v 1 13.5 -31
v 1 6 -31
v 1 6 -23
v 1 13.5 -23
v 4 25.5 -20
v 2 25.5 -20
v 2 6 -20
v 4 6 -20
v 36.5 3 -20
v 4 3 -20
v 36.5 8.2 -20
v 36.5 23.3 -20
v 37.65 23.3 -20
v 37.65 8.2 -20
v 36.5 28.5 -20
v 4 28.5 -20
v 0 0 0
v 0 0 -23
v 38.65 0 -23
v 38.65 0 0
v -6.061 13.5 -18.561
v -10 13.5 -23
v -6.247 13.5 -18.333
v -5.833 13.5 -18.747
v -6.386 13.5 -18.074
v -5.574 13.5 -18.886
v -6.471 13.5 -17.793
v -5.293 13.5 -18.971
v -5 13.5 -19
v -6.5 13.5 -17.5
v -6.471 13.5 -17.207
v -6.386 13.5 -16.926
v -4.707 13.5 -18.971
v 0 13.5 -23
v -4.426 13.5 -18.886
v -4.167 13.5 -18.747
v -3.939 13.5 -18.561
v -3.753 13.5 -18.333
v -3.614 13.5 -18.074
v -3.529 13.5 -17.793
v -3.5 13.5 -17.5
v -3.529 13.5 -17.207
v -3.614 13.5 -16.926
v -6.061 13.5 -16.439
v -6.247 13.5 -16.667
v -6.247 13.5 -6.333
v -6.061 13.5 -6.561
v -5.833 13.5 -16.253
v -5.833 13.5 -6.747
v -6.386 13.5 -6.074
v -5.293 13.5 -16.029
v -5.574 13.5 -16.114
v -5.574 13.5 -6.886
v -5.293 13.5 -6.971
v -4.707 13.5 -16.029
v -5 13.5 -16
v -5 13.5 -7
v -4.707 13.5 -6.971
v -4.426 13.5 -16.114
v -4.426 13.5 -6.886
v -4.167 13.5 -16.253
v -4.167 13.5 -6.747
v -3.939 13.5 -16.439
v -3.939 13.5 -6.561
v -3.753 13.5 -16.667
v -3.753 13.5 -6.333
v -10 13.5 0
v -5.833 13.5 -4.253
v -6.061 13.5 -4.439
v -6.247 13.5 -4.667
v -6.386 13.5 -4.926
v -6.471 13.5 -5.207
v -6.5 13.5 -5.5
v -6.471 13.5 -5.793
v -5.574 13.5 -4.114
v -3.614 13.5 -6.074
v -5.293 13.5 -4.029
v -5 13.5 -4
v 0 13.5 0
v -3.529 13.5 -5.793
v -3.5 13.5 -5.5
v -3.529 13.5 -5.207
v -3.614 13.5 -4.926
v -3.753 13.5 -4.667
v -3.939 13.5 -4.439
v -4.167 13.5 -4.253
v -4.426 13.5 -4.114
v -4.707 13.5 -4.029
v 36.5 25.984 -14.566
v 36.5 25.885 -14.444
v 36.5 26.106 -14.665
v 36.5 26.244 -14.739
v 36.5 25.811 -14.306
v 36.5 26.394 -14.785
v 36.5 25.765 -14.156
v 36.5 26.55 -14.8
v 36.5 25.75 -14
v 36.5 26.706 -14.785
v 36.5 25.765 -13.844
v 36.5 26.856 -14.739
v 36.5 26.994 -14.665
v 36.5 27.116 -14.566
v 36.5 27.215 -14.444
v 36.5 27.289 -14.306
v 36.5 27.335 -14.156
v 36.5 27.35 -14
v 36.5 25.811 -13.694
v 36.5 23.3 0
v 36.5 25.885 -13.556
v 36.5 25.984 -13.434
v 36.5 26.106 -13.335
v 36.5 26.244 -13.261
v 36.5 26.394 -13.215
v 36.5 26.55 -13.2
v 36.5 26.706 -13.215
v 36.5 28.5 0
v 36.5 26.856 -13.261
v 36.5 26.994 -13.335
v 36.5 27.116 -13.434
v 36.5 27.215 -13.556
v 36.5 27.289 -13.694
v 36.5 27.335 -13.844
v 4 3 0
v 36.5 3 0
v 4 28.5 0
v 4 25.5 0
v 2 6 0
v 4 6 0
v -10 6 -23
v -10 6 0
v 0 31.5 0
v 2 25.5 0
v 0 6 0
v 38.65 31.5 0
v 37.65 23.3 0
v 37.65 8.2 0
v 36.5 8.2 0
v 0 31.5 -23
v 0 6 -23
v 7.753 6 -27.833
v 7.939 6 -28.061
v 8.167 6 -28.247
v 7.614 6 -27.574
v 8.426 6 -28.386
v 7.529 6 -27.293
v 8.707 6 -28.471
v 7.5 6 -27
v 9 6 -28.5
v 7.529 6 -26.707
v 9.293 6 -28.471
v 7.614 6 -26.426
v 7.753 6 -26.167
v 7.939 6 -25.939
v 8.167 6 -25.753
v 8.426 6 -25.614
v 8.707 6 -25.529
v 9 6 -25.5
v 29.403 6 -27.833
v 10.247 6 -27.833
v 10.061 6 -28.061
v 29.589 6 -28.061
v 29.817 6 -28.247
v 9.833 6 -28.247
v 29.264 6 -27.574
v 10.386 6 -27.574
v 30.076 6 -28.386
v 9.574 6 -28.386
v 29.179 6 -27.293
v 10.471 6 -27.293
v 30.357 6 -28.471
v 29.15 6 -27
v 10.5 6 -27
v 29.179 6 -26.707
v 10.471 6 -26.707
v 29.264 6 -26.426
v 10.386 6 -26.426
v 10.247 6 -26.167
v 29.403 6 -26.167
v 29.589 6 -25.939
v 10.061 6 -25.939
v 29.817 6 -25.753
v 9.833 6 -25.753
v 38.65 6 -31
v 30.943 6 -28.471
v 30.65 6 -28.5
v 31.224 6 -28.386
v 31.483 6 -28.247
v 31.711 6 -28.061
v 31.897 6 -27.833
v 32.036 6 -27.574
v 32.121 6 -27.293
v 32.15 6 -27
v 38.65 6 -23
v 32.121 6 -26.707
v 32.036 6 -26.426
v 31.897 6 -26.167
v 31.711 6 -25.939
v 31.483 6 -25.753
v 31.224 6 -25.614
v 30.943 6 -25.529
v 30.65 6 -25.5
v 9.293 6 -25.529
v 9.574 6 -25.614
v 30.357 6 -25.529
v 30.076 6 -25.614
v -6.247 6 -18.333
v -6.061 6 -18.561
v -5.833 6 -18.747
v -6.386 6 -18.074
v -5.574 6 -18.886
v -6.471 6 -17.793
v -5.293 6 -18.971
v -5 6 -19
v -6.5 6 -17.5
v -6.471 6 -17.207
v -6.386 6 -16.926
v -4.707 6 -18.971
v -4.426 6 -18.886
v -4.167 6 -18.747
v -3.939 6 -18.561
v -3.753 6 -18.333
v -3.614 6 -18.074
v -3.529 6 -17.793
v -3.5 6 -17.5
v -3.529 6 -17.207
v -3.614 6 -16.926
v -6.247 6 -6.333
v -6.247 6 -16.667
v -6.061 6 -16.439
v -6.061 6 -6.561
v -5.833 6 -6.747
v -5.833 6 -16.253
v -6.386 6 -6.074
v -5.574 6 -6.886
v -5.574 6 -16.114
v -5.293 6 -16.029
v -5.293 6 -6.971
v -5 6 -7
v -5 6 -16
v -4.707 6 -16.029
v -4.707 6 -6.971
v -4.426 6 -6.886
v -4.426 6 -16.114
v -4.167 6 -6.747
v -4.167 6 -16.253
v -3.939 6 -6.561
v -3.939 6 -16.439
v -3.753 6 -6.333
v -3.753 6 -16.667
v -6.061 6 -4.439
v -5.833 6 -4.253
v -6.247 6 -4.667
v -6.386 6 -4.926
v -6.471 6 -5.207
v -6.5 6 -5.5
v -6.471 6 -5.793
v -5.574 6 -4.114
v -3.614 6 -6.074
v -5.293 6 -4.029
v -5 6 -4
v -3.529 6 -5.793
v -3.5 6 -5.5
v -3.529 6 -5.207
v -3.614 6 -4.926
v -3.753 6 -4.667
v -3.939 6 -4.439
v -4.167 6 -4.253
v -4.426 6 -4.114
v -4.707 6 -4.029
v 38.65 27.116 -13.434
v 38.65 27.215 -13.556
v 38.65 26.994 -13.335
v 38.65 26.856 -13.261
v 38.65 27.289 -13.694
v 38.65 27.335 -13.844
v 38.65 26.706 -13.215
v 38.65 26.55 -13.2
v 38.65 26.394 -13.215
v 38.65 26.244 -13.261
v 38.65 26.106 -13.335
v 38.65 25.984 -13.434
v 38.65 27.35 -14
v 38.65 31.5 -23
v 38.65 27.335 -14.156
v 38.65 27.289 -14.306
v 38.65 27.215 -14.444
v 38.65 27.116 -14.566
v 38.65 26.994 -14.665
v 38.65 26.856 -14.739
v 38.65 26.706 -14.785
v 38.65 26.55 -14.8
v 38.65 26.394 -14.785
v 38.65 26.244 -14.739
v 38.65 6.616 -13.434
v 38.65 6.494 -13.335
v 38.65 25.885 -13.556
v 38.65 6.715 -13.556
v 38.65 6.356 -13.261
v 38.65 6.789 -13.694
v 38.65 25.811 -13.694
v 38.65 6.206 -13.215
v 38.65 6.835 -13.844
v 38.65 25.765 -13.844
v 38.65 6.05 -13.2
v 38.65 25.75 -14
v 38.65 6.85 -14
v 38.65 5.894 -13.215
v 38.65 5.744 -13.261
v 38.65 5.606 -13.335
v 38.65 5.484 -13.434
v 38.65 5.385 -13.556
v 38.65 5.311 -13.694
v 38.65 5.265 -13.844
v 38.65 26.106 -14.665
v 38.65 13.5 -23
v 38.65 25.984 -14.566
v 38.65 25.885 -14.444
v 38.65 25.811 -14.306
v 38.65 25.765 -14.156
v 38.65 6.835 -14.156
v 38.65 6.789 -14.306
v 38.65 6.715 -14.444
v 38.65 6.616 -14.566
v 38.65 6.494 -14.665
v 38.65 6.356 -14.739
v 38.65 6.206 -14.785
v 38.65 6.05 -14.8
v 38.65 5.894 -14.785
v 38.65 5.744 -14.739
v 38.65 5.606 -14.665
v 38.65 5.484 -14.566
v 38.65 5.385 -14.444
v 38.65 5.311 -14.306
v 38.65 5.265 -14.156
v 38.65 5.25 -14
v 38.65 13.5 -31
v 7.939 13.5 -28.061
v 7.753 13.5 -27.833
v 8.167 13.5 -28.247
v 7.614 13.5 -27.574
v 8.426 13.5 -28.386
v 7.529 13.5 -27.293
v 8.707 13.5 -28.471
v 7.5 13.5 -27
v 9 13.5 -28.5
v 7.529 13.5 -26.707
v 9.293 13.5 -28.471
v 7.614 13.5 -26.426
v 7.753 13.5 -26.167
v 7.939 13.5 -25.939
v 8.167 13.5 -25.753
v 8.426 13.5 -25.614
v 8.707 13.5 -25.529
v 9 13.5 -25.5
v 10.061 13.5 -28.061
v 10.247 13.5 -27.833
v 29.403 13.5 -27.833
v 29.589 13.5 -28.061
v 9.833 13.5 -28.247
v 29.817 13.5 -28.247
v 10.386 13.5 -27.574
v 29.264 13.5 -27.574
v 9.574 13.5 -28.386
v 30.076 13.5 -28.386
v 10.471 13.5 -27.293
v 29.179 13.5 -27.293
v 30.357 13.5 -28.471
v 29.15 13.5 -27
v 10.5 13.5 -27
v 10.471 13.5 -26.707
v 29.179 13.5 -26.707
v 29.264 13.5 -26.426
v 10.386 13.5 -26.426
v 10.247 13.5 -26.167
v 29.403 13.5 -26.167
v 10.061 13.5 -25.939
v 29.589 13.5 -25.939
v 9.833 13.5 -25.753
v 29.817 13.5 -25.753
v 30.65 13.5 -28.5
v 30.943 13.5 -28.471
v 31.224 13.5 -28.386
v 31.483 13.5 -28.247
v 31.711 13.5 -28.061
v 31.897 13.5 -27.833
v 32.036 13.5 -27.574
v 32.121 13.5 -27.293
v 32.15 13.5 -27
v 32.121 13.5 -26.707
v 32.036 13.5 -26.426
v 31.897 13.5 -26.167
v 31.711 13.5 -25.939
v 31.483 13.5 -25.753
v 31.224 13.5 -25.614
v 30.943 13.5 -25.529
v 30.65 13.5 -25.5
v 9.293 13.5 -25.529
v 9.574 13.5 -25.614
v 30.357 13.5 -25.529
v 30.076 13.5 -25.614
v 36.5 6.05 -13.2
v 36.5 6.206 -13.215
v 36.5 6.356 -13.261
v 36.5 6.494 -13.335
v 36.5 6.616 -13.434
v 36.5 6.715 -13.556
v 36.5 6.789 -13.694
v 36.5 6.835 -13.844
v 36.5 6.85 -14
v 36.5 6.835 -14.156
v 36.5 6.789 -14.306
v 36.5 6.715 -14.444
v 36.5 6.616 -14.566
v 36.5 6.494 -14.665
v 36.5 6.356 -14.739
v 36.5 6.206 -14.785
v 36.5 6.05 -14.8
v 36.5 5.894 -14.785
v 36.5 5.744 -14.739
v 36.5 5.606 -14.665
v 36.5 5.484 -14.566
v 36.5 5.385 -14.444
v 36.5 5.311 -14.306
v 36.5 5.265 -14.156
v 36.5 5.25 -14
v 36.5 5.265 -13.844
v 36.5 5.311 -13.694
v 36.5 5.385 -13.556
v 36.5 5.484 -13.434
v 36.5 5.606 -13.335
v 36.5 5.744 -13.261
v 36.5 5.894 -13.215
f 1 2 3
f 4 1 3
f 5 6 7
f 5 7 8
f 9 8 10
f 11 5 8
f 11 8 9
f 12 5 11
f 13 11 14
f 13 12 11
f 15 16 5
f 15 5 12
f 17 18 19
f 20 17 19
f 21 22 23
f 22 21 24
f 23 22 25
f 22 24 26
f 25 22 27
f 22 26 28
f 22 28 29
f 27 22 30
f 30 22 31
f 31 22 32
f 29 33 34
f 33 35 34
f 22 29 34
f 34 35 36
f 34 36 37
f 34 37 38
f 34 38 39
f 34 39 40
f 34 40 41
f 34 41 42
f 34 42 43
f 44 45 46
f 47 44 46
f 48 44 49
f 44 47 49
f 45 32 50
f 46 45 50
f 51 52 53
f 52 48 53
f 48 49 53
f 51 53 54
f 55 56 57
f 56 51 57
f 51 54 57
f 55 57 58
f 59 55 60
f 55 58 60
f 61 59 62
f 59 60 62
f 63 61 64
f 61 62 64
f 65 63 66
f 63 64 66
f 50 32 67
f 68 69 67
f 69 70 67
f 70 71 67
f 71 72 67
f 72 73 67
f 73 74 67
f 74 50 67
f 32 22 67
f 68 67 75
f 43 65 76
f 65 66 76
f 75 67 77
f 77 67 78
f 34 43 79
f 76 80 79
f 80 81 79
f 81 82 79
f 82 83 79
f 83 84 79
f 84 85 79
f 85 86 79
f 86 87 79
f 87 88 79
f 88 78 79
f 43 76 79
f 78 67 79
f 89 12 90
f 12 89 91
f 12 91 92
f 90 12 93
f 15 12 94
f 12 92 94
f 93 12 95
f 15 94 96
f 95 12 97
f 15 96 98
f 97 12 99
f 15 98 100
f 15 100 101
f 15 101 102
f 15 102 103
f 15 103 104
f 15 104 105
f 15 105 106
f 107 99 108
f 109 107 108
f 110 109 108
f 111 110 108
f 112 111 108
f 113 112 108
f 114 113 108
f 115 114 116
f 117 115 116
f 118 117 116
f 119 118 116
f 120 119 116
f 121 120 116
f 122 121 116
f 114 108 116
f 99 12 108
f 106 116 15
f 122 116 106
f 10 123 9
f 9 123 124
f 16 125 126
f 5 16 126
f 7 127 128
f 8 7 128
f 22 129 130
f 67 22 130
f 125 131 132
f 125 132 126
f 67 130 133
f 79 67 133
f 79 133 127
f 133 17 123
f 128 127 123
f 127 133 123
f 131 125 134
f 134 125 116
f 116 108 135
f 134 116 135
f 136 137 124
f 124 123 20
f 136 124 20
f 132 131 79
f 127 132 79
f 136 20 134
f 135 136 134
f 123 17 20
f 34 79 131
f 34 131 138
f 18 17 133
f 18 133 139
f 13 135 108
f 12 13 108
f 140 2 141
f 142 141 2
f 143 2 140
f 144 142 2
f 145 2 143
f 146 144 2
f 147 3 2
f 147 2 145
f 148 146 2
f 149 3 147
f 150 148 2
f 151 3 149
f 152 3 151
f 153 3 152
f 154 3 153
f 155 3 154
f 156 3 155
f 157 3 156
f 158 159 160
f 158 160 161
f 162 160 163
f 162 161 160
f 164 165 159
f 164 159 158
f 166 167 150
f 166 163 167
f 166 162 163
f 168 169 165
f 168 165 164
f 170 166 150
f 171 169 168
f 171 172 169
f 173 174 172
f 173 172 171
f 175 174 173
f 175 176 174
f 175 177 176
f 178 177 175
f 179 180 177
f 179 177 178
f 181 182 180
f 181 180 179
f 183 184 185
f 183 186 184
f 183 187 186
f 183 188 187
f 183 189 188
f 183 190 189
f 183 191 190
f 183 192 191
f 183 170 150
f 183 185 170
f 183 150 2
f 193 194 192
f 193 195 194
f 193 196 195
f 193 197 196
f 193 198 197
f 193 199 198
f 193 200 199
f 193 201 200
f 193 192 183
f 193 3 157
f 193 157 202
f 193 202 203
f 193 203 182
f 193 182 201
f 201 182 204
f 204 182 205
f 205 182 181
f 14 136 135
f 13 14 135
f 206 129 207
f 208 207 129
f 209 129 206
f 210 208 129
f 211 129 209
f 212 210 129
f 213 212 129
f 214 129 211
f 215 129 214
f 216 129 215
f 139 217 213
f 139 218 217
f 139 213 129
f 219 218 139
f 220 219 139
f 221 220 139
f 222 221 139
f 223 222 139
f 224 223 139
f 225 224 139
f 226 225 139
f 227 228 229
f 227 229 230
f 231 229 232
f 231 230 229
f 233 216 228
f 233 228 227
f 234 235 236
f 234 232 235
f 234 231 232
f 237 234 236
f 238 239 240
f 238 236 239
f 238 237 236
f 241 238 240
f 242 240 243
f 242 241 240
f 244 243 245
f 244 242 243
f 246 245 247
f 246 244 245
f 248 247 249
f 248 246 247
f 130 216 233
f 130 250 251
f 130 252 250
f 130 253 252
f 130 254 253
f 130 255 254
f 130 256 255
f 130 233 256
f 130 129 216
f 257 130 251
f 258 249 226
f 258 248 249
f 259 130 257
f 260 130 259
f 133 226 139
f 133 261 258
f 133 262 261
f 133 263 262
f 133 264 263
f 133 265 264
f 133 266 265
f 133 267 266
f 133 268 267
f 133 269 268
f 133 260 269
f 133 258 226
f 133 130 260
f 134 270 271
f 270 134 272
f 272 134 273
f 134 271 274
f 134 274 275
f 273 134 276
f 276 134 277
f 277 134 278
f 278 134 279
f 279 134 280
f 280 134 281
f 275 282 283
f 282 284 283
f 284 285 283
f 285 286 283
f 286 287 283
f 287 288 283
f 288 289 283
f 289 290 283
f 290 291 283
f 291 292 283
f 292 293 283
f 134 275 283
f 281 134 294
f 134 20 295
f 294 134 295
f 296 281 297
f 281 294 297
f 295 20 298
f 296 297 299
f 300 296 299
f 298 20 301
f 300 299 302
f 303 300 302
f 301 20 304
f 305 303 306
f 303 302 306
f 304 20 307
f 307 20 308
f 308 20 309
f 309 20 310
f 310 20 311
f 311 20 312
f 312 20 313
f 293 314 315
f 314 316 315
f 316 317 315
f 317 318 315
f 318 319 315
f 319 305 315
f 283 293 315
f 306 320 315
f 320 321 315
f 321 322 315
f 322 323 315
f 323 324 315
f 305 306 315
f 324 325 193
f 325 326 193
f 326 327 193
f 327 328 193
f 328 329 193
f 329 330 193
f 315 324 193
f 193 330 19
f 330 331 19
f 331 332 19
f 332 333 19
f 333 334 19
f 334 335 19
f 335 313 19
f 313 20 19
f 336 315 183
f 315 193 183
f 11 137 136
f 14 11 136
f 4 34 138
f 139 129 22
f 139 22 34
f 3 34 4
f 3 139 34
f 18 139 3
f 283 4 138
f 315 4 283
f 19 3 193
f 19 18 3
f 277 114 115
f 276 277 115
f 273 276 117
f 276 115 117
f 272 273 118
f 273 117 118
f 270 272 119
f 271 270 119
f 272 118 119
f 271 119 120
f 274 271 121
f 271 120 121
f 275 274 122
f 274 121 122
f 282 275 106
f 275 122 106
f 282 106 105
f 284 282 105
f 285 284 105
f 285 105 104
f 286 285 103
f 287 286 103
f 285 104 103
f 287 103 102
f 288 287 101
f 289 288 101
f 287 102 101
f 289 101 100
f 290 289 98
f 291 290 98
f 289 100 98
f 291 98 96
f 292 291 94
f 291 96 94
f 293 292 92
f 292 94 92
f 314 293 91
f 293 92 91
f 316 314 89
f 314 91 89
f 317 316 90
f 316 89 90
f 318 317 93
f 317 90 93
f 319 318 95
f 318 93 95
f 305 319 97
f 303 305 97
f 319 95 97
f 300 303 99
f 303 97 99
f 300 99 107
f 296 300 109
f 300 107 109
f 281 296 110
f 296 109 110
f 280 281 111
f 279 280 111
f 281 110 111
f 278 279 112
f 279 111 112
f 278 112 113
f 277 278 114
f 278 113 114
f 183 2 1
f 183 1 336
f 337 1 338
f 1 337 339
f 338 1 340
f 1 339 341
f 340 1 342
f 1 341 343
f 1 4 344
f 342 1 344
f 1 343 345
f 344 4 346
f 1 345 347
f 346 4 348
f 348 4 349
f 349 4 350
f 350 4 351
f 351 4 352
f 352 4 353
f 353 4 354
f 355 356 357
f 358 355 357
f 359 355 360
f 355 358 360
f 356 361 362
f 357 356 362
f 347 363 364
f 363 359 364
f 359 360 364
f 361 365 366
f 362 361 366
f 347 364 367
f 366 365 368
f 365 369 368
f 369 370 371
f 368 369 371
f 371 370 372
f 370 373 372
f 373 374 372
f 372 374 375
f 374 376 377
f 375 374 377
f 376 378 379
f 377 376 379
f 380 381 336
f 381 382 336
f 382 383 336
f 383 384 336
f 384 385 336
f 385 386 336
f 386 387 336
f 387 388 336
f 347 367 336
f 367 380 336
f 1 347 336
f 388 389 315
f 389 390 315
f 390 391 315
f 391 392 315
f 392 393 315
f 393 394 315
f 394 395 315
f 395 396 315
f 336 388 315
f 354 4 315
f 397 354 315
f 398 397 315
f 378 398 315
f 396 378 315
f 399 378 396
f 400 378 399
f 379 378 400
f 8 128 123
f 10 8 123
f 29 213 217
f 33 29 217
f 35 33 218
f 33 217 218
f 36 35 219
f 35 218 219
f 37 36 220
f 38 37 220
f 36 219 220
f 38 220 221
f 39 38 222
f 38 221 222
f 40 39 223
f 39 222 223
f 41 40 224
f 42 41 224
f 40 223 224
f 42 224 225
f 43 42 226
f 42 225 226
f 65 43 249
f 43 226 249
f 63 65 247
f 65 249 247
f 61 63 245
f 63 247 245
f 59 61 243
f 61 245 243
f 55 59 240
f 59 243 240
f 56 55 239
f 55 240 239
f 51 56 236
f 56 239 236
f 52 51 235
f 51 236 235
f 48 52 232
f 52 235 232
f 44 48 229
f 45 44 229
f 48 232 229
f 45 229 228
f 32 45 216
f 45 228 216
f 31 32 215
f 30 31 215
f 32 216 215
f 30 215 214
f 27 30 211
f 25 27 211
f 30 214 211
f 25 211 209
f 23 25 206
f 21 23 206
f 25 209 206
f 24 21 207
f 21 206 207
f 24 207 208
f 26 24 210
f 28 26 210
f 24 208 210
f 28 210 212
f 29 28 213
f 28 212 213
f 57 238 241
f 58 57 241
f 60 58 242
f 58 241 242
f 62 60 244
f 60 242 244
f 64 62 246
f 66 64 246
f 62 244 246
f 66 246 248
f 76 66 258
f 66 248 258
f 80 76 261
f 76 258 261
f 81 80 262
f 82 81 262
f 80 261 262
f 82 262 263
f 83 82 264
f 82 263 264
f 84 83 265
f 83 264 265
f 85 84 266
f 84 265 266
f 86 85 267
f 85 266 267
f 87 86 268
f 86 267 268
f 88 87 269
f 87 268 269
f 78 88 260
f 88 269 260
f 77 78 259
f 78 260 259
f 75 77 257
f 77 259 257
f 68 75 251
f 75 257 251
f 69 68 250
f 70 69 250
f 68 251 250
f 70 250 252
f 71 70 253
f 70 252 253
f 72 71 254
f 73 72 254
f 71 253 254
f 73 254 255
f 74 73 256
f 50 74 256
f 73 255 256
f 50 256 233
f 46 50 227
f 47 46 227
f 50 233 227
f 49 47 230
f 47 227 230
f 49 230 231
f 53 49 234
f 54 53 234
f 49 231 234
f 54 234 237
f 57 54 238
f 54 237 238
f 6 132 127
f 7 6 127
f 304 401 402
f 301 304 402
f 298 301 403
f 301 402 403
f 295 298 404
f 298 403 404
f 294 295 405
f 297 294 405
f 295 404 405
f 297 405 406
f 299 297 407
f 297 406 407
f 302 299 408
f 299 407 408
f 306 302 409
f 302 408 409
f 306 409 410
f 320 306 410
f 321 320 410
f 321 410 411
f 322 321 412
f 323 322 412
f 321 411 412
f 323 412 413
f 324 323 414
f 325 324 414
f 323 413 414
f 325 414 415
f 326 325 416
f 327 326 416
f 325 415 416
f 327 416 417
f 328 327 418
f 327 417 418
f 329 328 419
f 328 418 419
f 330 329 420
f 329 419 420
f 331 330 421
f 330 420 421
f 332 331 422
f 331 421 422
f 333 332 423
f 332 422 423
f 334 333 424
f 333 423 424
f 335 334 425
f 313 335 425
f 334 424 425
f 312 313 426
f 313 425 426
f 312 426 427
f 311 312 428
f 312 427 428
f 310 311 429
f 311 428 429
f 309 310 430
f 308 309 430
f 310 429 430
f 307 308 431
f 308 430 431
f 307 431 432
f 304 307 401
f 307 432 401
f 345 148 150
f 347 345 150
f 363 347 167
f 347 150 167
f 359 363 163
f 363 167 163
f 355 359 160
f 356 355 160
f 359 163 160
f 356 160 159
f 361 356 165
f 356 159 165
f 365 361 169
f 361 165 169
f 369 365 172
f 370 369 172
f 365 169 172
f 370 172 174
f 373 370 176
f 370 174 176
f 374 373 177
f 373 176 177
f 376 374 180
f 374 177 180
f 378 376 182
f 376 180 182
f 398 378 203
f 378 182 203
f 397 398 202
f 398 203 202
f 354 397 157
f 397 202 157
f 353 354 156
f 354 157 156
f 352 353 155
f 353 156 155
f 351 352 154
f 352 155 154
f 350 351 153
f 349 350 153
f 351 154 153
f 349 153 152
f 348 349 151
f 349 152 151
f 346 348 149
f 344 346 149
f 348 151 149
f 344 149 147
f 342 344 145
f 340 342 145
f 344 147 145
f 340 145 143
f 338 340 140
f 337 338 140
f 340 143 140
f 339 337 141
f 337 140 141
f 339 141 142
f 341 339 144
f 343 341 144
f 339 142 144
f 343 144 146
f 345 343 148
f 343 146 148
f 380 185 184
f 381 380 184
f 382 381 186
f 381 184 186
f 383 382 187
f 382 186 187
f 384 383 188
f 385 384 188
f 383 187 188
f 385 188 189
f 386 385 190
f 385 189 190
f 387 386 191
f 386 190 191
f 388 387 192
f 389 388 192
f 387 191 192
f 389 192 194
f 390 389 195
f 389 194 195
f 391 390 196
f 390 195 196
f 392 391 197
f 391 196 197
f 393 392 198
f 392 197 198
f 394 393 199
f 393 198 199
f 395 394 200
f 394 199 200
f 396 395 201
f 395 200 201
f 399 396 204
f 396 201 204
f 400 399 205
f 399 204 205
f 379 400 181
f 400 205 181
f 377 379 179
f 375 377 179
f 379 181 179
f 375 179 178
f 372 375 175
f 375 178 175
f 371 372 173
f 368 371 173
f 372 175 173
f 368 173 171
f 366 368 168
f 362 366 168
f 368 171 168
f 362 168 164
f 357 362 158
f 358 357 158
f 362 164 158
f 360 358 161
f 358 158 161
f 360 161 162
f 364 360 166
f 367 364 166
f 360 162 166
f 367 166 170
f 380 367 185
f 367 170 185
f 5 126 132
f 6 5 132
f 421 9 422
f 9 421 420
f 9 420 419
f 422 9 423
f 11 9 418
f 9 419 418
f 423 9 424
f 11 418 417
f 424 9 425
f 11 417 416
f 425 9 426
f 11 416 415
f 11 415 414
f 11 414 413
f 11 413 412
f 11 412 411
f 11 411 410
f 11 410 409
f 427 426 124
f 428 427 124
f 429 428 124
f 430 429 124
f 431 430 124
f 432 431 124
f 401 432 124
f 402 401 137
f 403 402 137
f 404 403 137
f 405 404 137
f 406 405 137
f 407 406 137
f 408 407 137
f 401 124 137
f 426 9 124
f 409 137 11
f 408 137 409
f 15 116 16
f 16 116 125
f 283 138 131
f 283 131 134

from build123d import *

# Parameters (mm, degrees)
SKETCH1_W           = 38.65
SKETCH1_H           = 23
BOSS_EXTRUDE1_DEPTH = 31.5
CUT_EXTRUDE1_DEPTH  = 20
SKETCH4_R           = 0.8
CUT_EXTRUDE2_DEPTH  = 2.15
BOSS_EXTRUDE2_START = -6
SKETCH7_W           = 10
SKETCH7_H           = 23
SKETCH7_R           = 1.5
SKETCH7_W_2         = 37.65
SKETCH7_H_2         = 8
BOSS_EXTRUDE2_DEPTH = 7.5


with BuildPart() as part:
    # Sketch1 → Boss-Extrude1 (new body)
    with BuildSketch(Plane(origin=(0, 0, 0), x_dir=(1, 0, 0), z_dir=(0, 1, 0))):
        with Locations((19.325, 11.5)):
            Rectangle(SKETCH1_W, SKETCH1_H)
    extrude(amount=BOSS_EXTRUDE1_DEPTH)

    # Sketch3 → Cut-Extrude1 (cut)
    with BuildSketch(Plane.XY):
        Polygon((2, 25.5), (2, 6), (4, 6), (4, 3), (36.5, 3), (36.5, 8.2), (37.65, 8.2), (37.65, 23.3), (36.5, 23.3), (36.5, 28.5), (4, 28.5), (4, 25.5), align=None)
    extrude(amount=-CUT_EXTRUDE1_DEPTH, mode=Mode.SUBTRACT)

    # Sketch4 → Cut-Extrude2 (cut)
    with BuildSketch(Plane.ZY.offset(-36.5)):
        with Locations((-14, 26.55)):
            Circle(SKETCH4_R)
        with Locations((-14, 6.05)):
            Circle(SKETCH4_R)
    extrude(amount=-CUT_EXTRUDE2_DEPTH, mode=Mode.SUBTRACT)

    # Sketch7 → Boss-Extrude2 (add)
    # profile 1 of 2: a face of its own
    with BuildSketch(Plane.XZ.offset(BOSS_EXTRUDE2_START)):
        with Locations((-5, -11.5)):
            Rectangle(SKETCH7_W, SKETCH7_H)
        with Locations(Location((-5, -17.5, 0), (0, 0, 270))):
            Circle(SKETCH7_R, mode=Mode.SUBTRACT)
        with Locations(Location((-5, -5.5, 0), (0, 0, 270))):
            Circle(SKETCH7_R, mode=Mode.SUBTRACT)
    # profile 2 of 2: a face of its own
    with BuildSketch(Plane.XZ.offset(BOSS_EXTRUDE2_START)):
        with Locations((19.825, -27)):
            Rectangle(SKETCH7_W_2, SKETCH7_H_2)
        with Locations(Location((30.65, -27, 0), (0, 0, 270))):
            Circle(SKETCH7_R, mode=Mode.SUBTRACT)
        with Locations(Location((9, -27, 0), (0, 0, 270))):
            Circle(SKETCH7_R, mode=Mode.SUBTRACT)
    extrude(amount=-BOSS_EXTRUDE2_DEPTH)


solid = part.part
